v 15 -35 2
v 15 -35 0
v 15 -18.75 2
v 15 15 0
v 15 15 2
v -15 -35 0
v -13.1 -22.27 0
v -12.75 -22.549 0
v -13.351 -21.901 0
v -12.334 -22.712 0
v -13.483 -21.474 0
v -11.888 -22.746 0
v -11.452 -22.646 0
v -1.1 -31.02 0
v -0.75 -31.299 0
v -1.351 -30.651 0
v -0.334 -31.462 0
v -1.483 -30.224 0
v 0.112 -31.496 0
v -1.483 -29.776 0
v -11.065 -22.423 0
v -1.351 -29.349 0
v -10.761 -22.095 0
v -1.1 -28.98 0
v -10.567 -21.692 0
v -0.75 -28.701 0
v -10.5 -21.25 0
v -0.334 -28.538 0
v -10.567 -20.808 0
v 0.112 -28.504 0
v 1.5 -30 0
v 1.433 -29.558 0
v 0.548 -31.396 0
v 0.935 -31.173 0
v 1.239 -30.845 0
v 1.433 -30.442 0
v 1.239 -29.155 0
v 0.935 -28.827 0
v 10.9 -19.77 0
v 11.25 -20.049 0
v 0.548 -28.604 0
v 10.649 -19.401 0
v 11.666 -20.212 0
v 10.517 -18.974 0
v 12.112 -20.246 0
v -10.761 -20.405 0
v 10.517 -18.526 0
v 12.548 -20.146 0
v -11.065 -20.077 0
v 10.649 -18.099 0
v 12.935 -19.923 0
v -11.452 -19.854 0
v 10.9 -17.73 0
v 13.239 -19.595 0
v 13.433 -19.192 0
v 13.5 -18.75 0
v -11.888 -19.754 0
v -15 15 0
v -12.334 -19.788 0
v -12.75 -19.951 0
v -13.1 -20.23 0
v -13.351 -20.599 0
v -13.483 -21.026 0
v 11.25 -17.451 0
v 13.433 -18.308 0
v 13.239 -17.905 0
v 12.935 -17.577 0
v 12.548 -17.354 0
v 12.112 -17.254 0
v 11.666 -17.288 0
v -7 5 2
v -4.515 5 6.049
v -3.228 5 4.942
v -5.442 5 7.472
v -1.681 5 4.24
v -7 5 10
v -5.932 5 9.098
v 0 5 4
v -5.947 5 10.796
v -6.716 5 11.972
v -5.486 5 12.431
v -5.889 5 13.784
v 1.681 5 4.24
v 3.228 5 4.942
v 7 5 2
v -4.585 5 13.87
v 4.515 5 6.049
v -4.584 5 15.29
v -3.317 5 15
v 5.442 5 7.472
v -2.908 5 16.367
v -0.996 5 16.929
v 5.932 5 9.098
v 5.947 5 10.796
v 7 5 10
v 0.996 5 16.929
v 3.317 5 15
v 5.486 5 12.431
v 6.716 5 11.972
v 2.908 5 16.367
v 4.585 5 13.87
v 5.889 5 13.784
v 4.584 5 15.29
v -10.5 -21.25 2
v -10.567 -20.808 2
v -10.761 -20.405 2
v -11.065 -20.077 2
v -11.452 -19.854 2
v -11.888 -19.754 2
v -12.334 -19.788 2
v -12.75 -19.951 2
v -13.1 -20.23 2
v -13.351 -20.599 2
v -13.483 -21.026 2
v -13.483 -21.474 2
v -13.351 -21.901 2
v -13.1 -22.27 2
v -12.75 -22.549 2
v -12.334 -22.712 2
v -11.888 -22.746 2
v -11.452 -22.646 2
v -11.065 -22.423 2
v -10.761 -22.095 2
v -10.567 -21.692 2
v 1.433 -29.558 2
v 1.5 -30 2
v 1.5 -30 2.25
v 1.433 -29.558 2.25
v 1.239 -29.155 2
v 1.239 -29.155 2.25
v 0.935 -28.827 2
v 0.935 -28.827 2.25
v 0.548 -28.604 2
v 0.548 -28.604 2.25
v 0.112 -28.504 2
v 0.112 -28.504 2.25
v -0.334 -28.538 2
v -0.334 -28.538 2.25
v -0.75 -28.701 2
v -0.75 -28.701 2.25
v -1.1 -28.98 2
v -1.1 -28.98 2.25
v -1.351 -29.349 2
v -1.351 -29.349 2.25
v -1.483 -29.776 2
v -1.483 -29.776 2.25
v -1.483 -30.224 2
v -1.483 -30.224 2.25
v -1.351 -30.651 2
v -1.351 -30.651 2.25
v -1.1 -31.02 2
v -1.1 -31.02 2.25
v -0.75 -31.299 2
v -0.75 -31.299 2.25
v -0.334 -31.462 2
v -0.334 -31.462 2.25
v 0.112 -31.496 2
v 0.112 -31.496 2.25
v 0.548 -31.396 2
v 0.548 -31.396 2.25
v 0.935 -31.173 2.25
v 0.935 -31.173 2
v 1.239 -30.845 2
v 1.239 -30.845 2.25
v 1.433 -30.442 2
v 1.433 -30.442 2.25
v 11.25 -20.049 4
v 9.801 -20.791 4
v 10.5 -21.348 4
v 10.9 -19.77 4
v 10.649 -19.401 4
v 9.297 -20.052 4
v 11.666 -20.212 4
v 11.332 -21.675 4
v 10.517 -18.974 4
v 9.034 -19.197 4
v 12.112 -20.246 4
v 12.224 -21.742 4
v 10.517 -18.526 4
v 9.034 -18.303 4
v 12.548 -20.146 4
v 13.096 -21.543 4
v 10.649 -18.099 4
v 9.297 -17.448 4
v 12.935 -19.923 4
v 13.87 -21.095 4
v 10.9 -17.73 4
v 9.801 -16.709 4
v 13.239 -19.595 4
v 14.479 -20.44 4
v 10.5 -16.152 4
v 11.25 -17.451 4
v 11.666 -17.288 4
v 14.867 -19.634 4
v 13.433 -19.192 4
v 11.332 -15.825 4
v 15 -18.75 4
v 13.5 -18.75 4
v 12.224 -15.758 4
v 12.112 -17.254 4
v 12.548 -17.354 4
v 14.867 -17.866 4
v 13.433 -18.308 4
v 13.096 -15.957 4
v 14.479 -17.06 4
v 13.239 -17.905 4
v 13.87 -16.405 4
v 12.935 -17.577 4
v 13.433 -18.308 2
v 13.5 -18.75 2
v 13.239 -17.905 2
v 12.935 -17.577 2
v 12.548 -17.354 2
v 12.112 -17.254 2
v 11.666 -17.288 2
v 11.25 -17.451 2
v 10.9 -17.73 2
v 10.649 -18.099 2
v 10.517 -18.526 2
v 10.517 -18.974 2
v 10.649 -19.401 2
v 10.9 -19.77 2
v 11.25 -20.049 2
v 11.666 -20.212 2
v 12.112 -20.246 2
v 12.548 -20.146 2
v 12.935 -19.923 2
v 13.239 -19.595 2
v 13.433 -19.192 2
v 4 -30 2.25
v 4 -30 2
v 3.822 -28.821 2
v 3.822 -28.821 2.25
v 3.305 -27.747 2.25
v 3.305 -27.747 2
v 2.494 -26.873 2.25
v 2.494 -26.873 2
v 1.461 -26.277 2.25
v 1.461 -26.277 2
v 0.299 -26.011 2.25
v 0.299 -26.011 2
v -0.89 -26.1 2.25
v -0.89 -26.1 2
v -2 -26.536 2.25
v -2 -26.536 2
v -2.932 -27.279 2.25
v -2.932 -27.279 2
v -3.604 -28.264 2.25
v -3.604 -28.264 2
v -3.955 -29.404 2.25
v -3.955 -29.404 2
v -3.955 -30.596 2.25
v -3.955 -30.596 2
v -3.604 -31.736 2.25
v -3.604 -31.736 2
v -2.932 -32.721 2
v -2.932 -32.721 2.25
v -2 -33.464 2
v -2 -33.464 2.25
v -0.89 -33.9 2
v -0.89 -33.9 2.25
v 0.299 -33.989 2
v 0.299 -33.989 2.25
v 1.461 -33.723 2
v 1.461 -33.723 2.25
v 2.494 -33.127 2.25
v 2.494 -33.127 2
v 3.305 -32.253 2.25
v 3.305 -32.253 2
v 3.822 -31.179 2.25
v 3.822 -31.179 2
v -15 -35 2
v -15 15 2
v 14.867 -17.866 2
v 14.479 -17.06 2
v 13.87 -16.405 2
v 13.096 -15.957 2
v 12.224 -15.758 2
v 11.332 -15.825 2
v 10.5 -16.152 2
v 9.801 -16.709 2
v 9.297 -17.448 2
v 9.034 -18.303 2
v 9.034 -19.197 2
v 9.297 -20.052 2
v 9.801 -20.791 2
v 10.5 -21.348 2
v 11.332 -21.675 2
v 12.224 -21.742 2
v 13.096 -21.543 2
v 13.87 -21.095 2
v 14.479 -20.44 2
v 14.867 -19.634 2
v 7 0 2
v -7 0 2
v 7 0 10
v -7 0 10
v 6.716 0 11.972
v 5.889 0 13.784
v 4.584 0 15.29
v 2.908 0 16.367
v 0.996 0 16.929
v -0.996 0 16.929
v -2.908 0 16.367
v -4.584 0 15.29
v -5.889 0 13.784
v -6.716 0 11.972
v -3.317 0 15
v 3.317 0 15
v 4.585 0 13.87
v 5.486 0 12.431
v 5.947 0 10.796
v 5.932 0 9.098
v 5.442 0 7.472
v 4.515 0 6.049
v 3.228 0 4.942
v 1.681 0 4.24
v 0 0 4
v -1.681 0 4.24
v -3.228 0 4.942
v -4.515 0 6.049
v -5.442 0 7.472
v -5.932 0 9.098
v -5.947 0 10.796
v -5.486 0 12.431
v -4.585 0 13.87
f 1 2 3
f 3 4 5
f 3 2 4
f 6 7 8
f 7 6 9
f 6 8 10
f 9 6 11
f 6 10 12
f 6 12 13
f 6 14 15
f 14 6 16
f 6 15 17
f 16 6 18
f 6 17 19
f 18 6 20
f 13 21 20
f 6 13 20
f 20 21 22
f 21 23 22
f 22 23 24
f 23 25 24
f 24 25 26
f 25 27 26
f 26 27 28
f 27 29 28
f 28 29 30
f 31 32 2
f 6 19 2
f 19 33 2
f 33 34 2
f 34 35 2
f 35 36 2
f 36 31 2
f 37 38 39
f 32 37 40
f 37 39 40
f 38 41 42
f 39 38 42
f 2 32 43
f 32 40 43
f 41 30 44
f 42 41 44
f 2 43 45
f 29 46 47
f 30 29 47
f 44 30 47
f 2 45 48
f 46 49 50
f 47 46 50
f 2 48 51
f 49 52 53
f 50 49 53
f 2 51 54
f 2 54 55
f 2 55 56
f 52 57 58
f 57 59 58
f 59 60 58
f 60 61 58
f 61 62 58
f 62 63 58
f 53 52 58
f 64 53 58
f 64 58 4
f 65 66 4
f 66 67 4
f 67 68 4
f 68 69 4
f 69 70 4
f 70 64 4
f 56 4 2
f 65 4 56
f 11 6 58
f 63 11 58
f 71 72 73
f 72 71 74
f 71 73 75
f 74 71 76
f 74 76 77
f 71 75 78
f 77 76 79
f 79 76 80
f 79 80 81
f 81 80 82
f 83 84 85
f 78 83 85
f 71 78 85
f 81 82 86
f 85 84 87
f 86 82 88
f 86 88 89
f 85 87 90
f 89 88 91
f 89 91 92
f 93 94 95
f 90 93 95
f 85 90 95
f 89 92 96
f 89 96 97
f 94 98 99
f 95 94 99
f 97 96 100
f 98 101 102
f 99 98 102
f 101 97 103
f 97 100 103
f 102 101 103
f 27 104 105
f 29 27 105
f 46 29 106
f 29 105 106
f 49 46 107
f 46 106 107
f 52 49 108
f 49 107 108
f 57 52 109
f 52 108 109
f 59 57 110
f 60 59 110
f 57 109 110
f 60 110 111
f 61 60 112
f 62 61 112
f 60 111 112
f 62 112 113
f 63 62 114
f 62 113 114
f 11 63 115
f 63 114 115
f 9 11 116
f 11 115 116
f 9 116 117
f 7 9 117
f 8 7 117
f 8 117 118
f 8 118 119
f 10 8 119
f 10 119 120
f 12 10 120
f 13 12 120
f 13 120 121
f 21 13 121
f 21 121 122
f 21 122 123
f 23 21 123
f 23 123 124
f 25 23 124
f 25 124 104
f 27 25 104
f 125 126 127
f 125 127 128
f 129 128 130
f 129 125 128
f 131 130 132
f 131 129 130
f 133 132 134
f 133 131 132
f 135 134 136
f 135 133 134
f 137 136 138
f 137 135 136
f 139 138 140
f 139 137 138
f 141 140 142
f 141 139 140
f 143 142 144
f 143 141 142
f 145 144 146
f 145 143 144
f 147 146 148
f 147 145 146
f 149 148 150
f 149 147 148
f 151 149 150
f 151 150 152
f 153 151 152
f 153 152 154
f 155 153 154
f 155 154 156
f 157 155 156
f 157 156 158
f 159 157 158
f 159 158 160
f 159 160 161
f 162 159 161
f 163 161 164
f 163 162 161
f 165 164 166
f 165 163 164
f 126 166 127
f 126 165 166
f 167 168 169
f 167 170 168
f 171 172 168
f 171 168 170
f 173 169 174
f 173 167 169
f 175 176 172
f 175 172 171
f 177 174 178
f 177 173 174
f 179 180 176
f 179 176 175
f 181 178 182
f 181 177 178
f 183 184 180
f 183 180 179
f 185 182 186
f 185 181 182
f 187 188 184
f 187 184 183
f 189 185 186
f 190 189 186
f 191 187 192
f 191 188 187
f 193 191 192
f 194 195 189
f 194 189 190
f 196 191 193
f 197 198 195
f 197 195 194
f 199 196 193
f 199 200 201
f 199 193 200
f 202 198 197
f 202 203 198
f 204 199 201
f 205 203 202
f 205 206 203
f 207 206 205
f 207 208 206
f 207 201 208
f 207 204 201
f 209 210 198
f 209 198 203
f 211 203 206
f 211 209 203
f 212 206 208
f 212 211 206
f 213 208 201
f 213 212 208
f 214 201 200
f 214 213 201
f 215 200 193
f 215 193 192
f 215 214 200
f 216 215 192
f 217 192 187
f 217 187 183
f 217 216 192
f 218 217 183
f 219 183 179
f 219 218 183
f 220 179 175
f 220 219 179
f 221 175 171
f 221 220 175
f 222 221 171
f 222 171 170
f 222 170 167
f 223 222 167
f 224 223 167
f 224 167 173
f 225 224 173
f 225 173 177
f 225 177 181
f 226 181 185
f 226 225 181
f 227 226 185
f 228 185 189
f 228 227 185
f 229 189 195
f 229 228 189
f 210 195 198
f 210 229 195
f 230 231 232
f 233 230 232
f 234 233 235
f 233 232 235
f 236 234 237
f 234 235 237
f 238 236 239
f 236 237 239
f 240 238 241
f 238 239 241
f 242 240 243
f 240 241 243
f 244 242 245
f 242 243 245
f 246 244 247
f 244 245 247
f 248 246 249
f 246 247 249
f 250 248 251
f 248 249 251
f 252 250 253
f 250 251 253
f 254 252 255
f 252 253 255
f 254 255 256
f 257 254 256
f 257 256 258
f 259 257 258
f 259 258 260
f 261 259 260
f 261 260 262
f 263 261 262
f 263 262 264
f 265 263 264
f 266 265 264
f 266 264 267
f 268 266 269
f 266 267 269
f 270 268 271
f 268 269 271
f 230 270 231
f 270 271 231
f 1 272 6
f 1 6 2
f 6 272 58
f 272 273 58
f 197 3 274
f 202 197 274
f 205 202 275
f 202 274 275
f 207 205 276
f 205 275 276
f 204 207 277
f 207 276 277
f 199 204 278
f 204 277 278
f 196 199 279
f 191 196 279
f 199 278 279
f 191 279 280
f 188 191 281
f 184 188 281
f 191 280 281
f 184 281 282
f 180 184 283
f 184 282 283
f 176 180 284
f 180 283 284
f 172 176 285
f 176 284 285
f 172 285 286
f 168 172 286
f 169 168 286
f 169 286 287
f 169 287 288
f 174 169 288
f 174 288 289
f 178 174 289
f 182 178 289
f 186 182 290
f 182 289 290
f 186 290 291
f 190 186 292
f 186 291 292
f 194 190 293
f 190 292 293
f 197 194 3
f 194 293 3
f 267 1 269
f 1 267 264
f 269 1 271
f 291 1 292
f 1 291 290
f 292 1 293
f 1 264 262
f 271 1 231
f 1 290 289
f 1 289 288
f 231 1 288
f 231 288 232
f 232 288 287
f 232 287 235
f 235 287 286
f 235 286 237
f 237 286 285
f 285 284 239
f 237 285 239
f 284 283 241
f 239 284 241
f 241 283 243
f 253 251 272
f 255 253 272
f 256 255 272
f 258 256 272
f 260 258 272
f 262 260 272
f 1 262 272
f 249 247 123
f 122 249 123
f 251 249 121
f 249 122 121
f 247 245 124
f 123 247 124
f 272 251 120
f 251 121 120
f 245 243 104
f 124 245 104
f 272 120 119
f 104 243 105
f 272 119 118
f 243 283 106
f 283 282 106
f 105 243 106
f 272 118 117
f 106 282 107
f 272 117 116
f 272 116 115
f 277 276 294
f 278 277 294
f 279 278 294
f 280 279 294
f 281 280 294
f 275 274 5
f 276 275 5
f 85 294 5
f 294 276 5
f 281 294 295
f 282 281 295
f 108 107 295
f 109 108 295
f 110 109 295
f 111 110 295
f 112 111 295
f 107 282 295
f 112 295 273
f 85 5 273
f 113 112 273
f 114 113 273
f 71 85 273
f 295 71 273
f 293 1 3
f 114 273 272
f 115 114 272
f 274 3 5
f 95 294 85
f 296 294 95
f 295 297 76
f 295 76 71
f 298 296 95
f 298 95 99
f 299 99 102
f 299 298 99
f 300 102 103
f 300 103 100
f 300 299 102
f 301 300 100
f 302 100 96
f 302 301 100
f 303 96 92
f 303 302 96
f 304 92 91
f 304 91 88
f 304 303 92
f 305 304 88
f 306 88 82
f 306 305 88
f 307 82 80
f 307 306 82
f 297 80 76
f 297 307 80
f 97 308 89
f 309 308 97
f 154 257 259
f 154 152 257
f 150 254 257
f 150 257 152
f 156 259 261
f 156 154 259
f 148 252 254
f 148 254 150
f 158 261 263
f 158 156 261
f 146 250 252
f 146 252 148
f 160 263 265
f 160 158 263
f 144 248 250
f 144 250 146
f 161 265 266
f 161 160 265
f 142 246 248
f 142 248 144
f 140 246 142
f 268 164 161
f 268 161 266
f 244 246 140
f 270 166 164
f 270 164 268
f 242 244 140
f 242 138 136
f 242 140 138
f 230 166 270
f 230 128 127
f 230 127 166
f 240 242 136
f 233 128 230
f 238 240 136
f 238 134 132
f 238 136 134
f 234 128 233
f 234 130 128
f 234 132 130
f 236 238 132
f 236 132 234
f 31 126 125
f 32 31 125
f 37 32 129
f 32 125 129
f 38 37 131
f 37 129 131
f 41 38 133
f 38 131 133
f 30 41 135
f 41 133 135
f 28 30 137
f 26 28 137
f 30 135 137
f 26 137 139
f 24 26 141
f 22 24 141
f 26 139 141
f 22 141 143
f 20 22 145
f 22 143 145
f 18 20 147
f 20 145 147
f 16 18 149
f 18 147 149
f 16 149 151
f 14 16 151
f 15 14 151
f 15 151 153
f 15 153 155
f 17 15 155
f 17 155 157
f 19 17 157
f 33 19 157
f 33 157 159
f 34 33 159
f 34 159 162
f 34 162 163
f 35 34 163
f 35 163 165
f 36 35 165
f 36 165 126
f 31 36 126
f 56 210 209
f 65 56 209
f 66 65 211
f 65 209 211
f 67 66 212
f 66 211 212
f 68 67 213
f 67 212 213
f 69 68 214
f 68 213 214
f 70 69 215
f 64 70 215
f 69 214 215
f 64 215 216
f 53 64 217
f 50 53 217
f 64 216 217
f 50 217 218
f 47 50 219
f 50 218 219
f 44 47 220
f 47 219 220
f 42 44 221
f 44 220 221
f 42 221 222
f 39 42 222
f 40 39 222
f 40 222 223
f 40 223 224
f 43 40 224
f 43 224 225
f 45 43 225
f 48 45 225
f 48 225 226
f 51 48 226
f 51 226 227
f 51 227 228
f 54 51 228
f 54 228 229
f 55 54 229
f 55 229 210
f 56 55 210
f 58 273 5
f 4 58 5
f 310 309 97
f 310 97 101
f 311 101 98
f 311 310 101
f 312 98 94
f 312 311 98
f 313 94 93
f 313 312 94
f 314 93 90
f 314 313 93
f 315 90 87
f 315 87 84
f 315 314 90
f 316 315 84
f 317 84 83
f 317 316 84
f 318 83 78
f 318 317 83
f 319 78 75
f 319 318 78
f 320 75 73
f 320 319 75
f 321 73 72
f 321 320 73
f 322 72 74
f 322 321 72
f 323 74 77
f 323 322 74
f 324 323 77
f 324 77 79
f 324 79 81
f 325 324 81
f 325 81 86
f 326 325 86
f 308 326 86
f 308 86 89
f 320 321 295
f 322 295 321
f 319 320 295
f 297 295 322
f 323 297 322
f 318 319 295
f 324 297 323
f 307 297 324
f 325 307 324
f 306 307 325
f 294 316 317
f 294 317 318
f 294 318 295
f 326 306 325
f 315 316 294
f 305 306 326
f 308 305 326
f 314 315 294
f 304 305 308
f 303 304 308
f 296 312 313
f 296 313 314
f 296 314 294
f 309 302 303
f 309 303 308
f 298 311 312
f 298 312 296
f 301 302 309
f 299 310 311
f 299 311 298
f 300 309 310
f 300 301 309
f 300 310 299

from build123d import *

# Parameters (mm, degrees)
F1_DEPTH = 5
F2_DEPTH = 15
F3_DEPTH = 35
F4_R     = 3
F4_R_2   = 1.5
F5_DEPTH = 2
F4_R_3   = 4
F6_DEPTH = 0.25
F7_DEPTH = 25


# Not quite as in the source:
# - a feature names something its author has since deleted; it is built from what else it names


with BuildPart() as f1:
    # F0 (on Front) → F1 (new body)
    with BuildSketch(Plane.XZ):
        with BuildLine():
            Line((7, 2), (7, 10))
            ThreePointArc((7, 10), (0, 17), (-7, 10))
            Line((-7, 10), (-7, 2))
            Line((-7, 2), (7, 2))
        make_face()
        with BuildLine():
            ThreePointArc((3.3166247904, 15), (0, 4), (-3.3166247904, 15))
            Line((-3.3166247904, 15), (3.3166247904, 15))
        make_face(mode=Mode.SUBTRACT)
    extrude(amount=-F1_DEPTH)

    # F0 (on Front) → F2 (join)
    with BuildSketch(Plane.XZ):
        Polygon((15, 2), (7, 2), (-7, 2), (-15, 2), (-15, 0), (15, 0), align=None)
    extrude(amount=-F2_DEPTH)

    # F0 (on Front) → F3 (join)
    with BuildSketch(Plane.XZ):
        Polygon((15, 2), (7, 2), (-7, 2), (-15, 2), (-15, 0), (15, 0), align=None)
    extrude(amount=F3_DEPTH)

    # F4 (on face) → F5 (join)
    with BuildSketch(Plane.XY.offset(2)):
        with Locations((12, -18.75)):
            Circle(F4_R)
        with Locations((12, -18.75)):
            Circle(F4_R_2, mode=Mode.SUBTRACT)
    extrude(amount=F5_DEPTH)

    # F4 (on face) → F6 (join)
    with BuildSketch(Plane.XY.offset(2)):
        with Locations((0, -30)):
            Circle(F4_R_3)
        with Locations((0, -30)):
            Circle(F4_R_2, mode=Mode.SUBTRACT)
    extrude(amount=F6_DEPTH)

    # F4 (on face) → F7 (cut)
    with BuildSketch(Plane.XY.offset(2)):
        with Locations((-12, -21.25)):
            Circle(F4_R_2)
        with Locations((0, -30)):
            Circle(F4_R_2)
        with Locations((12, -18.75)):
            Circle(F4_R_2)
    extrude(amount=-F7_DEPTH, mode=Mode.SUBTRACT)


solid = f1.part
